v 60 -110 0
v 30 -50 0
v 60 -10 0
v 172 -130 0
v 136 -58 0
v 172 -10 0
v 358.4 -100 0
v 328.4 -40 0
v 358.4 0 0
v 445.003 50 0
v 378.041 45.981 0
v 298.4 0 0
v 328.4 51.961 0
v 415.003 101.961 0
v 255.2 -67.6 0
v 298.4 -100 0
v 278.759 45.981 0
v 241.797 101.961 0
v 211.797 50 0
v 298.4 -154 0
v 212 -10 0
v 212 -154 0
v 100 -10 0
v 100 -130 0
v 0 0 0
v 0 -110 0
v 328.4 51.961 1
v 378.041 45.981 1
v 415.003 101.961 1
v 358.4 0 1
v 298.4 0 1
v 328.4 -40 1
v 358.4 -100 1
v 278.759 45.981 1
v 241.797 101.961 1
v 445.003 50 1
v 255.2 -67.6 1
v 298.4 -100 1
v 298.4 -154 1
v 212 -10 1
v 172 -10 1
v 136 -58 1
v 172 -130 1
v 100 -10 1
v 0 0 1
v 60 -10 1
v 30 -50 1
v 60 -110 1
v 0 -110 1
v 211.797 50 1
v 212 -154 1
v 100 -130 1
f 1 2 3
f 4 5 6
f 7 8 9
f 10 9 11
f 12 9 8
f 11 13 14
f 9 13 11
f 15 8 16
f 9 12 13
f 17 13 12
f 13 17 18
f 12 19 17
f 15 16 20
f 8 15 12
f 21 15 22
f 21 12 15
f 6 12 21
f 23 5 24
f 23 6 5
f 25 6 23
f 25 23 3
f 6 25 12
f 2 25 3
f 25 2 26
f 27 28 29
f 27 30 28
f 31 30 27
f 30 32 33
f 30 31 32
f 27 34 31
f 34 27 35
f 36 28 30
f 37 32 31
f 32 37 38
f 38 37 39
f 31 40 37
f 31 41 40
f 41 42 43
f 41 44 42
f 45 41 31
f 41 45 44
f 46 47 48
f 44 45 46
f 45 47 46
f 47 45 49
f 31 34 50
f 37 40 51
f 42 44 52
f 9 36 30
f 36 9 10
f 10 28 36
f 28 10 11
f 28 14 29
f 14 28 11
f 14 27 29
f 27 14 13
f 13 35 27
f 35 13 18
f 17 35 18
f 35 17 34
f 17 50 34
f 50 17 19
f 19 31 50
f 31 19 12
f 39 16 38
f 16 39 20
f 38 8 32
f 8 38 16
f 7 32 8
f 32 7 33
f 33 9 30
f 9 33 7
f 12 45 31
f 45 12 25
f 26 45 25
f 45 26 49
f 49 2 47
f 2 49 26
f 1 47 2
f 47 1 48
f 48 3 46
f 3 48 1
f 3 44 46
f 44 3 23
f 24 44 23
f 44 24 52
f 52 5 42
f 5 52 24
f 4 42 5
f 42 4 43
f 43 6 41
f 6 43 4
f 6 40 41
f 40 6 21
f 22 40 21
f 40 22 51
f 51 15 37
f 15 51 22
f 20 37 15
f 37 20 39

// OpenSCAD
// Generated by Parametrix
ca_myPartH_faceCircle_000 = [ [ 298.4000, 0.0000 ],[ 298.4000, -100.0000 ],[ 328.4000, -40.0000 ],[ 358.4000, -100.0000 ],[ 358.4000, 0.0000 ],[ 445.0025, 50.0000 ],[ 378.0410, 45.9808 ],[ 415.0025, 101.9615 ],[ 328.4000, 51.9615 ],[ 241.7975, 101.9615 ],[ 278.7590, 45.9808 ],[ 211.7975, 50.0000 ],[ 298.4000, 0.0000 ] ];
cb_myPartH_faceCircle_000 = [  0, 1, 2, 3, 4, 5, 6, 7, 8, 9, 10, 11, 12 ];
a_myPartH_faceCircle = concat(ca_myPartH_faceCircle_000);
b_myPartH_faceCircle = [cb_myPartH_faceCircle_000];
ca_myPartH_faceLine_000 = [ [ 0.0000, 0.0000 ],[ 0.0000, -10.0000 ],[ 0.0000, -110.0000 ],[ 30.0000, -50.0000 ],[ 60.0000, -110.0000 ],[ 60.0000, -10.0000 ],[ 100.0000, -10.0000 ],[ 100.0000, -130.0000 ],[ 136.0000, -58.0000 ],[ 172.0000, -130.0000 ],[ 172.0000, -10.0000 ],[ 212.0000, -10.0000 ],[ 212.0000, -154.0000 ],[ 255.2000, -67.6000 ],[ 298.4000, -154.0000 ],[ 298.4000, -10.0000 ],[ 298.4000, 0.0000 ],[ 0.0000, 0.0000 ] ];
cb_myPartH_faceLine_000 = [  0, 1, 2, 3, 4, 5, 6, 7, 8, 9, 10, 11, 12, 13, 14, 15, 16, 17 ];
a_myPartH_faceLine = concat(ca_myPartH_faceLine_000);
b_myPartH_faceLine = [cb_myPartH_faceLine_000];

module subpax_myPartH_circle () {
	translate( [ 0, 0, 0 ])
		rotate( [ 0, 0, 0 ])
			   linear_extrude(height = 1) polygon(a_myPartH_faceCircle, b_myPartH_faceCircle);
}

module subpax_myPartH_line () {
	translate( [ 0, 0, 0 ])
		rotate( [ 0, 0, 0 ])
			   linear_extrude(height = 1) polygon(a_myPartH_faceLine, b_myPartH_faceLine);
}

module pax_myPartH () {
	union () {
		subpax_myPartH_circle();
subpax_myPartH_line();
	}
}

pax_myPartH();
